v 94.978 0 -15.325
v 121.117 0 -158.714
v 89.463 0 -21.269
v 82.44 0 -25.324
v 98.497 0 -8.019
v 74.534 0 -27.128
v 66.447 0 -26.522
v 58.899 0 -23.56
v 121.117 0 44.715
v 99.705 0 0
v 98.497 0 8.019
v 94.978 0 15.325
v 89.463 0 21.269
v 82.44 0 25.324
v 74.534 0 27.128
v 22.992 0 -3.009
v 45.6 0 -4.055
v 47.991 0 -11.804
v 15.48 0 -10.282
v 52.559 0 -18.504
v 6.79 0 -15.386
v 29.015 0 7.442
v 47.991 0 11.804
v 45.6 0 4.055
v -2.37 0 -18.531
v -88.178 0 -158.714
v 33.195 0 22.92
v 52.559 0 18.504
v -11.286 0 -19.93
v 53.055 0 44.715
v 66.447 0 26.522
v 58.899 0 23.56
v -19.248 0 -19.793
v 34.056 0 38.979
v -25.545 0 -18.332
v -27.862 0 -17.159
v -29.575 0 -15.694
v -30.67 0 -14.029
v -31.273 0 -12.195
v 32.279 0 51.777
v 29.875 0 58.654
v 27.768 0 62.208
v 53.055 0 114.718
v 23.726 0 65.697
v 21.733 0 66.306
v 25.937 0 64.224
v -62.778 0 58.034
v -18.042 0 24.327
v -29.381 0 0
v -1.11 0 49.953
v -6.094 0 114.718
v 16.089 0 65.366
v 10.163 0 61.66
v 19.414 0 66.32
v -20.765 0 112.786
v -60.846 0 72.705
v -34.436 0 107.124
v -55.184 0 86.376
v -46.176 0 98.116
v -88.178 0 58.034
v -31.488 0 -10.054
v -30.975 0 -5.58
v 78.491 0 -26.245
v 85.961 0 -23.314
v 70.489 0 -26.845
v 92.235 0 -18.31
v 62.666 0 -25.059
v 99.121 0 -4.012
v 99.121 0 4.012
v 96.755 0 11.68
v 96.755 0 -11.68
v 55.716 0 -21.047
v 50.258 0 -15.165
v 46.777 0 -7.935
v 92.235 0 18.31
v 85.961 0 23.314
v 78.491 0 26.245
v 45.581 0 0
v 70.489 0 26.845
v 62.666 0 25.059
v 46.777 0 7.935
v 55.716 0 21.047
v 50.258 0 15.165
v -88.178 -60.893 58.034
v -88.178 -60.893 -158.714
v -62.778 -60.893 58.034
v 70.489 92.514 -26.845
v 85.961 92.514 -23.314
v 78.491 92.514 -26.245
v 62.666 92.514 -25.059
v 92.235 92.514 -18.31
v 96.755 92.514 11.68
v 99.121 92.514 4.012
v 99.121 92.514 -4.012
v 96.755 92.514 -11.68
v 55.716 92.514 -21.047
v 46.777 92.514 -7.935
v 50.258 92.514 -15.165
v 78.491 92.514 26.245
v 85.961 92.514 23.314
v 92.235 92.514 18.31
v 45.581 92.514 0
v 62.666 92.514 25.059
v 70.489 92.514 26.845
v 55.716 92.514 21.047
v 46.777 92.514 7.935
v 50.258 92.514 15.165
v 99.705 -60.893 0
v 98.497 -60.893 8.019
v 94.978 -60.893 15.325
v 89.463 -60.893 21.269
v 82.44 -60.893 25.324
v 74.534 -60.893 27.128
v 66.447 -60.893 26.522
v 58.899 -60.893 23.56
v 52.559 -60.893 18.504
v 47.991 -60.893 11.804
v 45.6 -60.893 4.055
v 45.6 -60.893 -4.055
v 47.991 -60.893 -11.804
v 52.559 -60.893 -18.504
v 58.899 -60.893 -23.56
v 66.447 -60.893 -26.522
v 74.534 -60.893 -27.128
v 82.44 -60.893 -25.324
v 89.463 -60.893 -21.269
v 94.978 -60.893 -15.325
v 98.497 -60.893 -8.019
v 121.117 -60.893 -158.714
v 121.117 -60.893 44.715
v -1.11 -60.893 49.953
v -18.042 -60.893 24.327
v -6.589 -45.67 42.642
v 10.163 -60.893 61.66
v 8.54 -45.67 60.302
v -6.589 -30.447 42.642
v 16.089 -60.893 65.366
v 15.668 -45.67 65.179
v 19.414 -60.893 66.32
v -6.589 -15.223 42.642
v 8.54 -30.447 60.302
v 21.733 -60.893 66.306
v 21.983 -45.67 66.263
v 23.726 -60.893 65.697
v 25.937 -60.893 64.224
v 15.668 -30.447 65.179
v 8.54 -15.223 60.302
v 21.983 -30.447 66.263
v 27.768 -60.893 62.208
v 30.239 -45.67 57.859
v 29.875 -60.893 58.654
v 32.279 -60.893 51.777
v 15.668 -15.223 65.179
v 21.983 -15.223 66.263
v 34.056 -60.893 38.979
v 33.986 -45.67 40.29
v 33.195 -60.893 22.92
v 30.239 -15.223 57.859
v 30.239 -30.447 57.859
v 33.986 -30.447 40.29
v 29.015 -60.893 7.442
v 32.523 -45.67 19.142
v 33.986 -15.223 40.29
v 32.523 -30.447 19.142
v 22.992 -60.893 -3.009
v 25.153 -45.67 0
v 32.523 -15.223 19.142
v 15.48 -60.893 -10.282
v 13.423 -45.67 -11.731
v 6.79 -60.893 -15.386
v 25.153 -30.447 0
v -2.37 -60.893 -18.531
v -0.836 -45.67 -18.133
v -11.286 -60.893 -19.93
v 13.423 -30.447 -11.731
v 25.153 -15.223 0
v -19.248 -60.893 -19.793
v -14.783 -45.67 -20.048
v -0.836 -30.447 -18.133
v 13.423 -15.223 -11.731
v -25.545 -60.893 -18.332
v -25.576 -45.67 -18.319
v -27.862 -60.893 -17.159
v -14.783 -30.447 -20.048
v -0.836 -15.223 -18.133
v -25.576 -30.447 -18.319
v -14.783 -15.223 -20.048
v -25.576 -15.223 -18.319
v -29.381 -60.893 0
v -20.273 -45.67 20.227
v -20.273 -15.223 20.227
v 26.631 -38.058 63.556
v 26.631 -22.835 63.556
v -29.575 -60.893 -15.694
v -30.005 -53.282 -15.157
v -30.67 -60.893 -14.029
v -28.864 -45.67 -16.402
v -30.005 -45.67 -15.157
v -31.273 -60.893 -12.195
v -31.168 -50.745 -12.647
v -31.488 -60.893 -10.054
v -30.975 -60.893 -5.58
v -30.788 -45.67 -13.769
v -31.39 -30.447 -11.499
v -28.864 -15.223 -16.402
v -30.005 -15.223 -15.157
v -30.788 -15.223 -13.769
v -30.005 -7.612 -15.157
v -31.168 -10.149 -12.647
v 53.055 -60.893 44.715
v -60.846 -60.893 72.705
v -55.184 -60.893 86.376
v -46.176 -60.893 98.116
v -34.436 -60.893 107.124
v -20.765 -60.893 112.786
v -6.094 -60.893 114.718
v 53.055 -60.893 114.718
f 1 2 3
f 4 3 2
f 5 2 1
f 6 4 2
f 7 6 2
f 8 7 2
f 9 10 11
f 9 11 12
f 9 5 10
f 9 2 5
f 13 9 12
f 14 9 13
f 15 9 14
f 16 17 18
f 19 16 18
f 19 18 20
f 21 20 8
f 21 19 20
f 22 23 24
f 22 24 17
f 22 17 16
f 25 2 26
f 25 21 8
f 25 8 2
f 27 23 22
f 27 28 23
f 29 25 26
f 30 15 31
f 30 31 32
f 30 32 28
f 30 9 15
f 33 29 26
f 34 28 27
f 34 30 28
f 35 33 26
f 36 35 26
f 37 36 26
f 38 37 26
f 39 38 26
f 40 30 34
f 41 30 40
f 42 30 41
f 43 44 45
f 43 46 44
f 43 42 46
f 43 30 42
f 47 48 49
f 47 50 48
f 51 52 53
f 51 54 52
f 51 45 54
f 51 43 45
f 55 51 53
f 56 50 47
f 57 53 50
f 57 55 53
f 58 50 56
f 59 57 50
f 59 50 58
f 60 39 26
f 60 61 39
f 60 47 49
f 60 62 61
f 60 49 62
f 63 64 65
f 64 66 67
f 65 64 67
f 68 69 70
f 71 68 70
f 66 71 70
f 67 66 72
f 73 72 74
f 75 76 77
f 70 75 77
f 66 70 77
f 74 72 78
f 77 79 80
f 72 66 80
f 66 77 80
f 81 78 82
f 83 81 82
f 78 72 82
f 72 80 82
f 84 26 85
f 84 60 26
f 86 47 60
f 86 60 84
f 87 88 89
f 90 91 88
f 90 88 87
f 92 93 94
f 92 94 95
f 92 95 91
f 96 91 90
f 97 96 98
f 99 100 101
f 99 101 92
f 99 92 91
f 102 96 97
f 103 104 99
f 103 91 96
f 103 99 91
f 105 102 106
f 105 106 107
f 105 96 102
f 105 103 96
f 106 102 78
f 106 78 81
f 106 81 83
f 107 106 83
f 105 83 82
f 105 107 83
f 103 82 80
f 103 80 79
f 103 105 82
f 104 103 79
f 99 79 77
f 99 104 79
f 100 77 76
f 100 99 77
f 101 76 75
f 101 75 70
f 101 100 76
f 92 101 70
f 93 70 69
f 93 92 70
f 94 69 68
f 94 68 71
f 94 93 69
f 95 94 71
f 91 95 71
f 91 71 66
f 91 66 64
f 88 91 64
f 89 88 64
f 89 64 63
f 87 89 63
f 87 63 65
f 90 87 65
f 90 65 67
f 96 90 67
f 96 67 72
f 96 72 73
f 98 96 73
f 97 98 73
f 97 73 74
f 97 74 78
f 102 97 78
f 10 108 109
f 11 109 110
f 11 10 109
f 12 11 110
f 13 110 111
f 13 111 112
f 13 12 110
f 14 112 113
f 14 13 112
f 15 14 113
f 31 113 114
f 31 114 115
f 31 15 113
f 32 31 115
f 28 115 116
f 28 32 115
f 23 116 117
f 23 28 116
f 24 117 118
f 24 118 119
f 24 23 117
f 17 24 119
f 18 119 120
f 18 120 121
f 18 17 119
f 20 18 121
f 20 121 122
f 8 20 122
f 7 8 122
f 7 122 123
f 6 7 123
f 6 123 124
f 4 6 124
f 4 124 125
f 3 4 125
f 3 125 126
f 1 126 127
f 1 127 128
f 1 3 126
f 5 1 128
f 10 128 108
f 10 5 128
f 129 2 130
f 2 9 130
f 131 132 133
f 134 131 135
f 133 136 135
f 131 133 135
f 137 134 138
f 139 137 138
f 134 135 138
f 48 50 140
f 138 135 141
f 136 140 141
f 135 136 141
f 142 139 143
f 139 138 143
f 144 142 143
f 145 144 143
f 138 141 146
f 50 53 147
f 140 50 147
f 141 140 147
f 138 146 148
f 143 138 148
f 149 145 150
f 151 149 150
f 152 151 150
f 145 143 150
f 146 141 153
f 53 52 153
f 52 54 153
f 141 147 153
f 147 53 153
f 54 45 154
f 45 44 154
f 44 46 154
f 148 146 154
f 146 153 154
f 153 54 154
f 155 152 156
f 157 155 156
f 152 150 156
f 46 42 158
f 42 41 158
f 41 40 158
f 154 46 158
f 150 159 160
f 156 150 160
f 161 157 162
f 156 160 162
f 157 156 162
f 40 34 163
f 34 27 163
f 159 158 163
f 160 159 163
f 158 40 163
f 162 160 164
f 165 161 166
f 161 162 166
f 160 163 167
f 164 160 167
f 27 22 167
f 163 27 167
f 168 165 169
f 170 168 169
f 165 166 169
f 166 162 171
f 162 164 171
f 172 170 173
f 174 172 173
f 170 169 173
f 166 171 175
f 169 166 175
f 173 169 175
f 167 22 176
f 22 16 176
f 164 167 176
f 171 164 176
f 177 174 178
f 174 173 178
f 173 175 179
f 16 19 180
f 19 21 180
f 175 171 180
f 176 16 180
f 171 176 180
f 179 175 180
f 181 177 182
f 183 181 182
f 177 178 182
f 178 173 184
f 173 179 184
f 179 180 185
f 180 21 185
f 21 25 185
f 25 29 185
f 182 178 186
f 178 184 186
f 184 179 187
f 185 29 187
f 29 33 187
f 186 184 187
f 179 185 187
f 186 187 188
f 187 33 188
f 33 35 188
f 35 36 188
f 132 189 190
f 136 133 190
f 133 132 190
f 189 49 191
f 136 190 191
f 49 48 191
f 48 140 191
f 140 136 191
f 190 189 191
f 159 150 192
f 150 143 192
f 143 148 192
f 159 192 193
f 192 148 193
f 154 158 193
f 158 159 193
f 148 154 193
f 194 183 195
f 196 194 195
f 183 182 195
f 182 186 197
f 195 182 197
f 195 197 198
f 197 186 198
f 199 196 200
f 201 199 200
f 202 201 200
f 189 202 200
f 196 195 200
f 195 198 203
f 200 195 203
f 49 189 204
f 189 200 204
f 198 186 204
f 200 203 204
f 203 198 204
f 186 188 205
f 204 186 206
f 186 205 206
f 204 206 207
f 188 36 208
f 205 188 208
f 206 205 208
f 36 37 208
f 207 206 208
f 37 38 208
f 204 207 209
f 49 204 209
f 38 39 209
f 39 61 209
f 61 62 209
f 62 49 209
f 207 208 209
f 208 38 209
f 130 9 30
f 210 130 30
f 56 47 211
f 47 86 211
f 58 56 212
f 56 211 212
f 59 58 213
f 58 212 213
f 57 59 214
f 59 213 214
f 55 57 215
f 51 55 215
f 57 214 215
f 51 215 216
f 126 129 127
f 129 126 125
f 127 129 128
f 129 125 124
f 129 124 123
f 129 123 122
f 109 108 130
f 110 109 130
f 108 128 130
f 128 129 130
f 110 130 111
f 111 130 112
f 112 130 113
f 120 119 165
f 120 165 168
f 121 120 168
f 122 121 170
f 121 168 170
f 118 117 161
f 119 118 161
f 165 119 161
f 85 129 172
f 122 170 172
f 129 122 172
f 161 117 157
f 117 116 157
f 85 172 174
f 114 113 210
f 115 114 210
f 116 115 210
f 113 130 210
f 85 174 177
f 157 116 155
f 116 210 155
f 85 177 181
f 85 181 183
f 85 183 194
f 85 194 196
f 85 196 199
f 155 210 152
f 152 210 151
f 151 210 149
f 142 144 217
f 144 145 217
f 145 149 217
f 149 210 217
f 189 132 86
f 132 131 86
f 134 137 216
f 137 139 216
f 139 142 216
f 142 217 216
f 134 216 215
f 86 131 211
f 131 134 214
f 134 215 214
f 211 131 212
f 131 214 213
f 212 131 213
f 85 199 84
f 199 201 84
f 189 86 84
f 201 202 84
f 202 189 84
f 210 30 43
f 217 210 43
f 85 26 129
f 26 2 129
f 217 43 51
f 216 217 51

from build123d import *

# Parameters (mm, degrees)
F0_R      = 27.2043930804
F1_DEPTH  = 60.893477872
F2_R      = 56.6833195886
F3_R      = 26.9202980766
F4_DEPTH  = 188.1199926138
F5_DEPTH  = 143.7802445143
F8_DEPTH  = 25.4
F9_DEPTH  = 88.3794147521
F10_DEPTH = 95.6057533622


# Not quite as in the source:
# - a feature of the source that left no trace in its solid (it failed there, or was rolled back) is left out


with BuildPart() as f1:
    # F0 (on Front) → F1 (new body)
    with BuildSketch(Plane.XZ):
        Polygon((-62.7778023481, 114.7176772356), (-62.7778023481, -70.334173739), (121.1167871952, -70.334173739), (121.1167871952, 44.7145961225), (53.0546493828, 44.7145961225), (53.0546493828, 114.7176772356), align=None)
        with Locations((72.5009217858, 0)):
            Circle(F0_R, mode=Mode.SUBTRACT)
        with BuildLine():
            add(Edge.make_bspline(
                [(-29.3809175491, 0), (-21.679578827, 22.4236781976), (31.7086513943, 110.8080219924), (42.4199428526, -16.1208348012), (-30.4596532938, -24.5098615886), (-33.0190651742, -10.5930481079), (-29.3809175491, 0)],
                knots=[0, 0, 0, 0, 0.3160546751, 0.5971945413, 0.8506943264, 1, 1, 1, 1], degree=3))
        make_face(mode=Mode.SUBTRACT)
    extrude(amount=F1_DEPTH)

    # F2
    f2_edges = [f1.edges().sort_by_distance(p)[0] for p in [
        (-62.777802, -30.446739, 114.717677),
    ]]
    fillet(f2_edges, radius=F2_R)

    # F8 (add): a face of the model
    f8_faces = [f1.faces().sort_by_distance(p)[0] for p in [
        (-62.7778023481, -30.446738936, -6.149908046),
    ]]
    extrude(f8_faces, amount=F8_DEPTH)

    # F9 (add): a face of the model
    f9_faces = [f1.faces().sort_by_distance(p)[0] for p in [
        (16.4694924235, -30.446738936, -70.334173739),
    ]]
    extrude(f9_faces, amount=F9_DEPTH)


with BuildPart() as f4:
    # F3 (on face) → F4 (new body)
    with BuildSketch(Plane(origin=(0, 0, 0), x_dir=(-1, 0, 0), z_dir=(0, 1, 0))):
        with Locations((-72.5009217858, 0)):
            Circle(F3_R)
    extrude(amount=F4_DEPTH)

    # F5 (add): a face of the model
    f5_faces = [f4.faces().sort_by_distance(p)[0] for p in [
        (72.5009217858, 188.1199926138, 0),
    ]]
    extrude(f5_faces, amount=-F5_DEPTH)

    # F10 (cut): a face of the model
    f10_faces = [f4.faces().sort_by_distance(p)[0] for p in [
        (72.5009217858, 188.1199926138, 0),
    ]]
    extrude(f10_faces, amount=-F10_DEPTH, mode=Mode.SUBTRACT)


solid = Compound([f1.part, f4.part])
